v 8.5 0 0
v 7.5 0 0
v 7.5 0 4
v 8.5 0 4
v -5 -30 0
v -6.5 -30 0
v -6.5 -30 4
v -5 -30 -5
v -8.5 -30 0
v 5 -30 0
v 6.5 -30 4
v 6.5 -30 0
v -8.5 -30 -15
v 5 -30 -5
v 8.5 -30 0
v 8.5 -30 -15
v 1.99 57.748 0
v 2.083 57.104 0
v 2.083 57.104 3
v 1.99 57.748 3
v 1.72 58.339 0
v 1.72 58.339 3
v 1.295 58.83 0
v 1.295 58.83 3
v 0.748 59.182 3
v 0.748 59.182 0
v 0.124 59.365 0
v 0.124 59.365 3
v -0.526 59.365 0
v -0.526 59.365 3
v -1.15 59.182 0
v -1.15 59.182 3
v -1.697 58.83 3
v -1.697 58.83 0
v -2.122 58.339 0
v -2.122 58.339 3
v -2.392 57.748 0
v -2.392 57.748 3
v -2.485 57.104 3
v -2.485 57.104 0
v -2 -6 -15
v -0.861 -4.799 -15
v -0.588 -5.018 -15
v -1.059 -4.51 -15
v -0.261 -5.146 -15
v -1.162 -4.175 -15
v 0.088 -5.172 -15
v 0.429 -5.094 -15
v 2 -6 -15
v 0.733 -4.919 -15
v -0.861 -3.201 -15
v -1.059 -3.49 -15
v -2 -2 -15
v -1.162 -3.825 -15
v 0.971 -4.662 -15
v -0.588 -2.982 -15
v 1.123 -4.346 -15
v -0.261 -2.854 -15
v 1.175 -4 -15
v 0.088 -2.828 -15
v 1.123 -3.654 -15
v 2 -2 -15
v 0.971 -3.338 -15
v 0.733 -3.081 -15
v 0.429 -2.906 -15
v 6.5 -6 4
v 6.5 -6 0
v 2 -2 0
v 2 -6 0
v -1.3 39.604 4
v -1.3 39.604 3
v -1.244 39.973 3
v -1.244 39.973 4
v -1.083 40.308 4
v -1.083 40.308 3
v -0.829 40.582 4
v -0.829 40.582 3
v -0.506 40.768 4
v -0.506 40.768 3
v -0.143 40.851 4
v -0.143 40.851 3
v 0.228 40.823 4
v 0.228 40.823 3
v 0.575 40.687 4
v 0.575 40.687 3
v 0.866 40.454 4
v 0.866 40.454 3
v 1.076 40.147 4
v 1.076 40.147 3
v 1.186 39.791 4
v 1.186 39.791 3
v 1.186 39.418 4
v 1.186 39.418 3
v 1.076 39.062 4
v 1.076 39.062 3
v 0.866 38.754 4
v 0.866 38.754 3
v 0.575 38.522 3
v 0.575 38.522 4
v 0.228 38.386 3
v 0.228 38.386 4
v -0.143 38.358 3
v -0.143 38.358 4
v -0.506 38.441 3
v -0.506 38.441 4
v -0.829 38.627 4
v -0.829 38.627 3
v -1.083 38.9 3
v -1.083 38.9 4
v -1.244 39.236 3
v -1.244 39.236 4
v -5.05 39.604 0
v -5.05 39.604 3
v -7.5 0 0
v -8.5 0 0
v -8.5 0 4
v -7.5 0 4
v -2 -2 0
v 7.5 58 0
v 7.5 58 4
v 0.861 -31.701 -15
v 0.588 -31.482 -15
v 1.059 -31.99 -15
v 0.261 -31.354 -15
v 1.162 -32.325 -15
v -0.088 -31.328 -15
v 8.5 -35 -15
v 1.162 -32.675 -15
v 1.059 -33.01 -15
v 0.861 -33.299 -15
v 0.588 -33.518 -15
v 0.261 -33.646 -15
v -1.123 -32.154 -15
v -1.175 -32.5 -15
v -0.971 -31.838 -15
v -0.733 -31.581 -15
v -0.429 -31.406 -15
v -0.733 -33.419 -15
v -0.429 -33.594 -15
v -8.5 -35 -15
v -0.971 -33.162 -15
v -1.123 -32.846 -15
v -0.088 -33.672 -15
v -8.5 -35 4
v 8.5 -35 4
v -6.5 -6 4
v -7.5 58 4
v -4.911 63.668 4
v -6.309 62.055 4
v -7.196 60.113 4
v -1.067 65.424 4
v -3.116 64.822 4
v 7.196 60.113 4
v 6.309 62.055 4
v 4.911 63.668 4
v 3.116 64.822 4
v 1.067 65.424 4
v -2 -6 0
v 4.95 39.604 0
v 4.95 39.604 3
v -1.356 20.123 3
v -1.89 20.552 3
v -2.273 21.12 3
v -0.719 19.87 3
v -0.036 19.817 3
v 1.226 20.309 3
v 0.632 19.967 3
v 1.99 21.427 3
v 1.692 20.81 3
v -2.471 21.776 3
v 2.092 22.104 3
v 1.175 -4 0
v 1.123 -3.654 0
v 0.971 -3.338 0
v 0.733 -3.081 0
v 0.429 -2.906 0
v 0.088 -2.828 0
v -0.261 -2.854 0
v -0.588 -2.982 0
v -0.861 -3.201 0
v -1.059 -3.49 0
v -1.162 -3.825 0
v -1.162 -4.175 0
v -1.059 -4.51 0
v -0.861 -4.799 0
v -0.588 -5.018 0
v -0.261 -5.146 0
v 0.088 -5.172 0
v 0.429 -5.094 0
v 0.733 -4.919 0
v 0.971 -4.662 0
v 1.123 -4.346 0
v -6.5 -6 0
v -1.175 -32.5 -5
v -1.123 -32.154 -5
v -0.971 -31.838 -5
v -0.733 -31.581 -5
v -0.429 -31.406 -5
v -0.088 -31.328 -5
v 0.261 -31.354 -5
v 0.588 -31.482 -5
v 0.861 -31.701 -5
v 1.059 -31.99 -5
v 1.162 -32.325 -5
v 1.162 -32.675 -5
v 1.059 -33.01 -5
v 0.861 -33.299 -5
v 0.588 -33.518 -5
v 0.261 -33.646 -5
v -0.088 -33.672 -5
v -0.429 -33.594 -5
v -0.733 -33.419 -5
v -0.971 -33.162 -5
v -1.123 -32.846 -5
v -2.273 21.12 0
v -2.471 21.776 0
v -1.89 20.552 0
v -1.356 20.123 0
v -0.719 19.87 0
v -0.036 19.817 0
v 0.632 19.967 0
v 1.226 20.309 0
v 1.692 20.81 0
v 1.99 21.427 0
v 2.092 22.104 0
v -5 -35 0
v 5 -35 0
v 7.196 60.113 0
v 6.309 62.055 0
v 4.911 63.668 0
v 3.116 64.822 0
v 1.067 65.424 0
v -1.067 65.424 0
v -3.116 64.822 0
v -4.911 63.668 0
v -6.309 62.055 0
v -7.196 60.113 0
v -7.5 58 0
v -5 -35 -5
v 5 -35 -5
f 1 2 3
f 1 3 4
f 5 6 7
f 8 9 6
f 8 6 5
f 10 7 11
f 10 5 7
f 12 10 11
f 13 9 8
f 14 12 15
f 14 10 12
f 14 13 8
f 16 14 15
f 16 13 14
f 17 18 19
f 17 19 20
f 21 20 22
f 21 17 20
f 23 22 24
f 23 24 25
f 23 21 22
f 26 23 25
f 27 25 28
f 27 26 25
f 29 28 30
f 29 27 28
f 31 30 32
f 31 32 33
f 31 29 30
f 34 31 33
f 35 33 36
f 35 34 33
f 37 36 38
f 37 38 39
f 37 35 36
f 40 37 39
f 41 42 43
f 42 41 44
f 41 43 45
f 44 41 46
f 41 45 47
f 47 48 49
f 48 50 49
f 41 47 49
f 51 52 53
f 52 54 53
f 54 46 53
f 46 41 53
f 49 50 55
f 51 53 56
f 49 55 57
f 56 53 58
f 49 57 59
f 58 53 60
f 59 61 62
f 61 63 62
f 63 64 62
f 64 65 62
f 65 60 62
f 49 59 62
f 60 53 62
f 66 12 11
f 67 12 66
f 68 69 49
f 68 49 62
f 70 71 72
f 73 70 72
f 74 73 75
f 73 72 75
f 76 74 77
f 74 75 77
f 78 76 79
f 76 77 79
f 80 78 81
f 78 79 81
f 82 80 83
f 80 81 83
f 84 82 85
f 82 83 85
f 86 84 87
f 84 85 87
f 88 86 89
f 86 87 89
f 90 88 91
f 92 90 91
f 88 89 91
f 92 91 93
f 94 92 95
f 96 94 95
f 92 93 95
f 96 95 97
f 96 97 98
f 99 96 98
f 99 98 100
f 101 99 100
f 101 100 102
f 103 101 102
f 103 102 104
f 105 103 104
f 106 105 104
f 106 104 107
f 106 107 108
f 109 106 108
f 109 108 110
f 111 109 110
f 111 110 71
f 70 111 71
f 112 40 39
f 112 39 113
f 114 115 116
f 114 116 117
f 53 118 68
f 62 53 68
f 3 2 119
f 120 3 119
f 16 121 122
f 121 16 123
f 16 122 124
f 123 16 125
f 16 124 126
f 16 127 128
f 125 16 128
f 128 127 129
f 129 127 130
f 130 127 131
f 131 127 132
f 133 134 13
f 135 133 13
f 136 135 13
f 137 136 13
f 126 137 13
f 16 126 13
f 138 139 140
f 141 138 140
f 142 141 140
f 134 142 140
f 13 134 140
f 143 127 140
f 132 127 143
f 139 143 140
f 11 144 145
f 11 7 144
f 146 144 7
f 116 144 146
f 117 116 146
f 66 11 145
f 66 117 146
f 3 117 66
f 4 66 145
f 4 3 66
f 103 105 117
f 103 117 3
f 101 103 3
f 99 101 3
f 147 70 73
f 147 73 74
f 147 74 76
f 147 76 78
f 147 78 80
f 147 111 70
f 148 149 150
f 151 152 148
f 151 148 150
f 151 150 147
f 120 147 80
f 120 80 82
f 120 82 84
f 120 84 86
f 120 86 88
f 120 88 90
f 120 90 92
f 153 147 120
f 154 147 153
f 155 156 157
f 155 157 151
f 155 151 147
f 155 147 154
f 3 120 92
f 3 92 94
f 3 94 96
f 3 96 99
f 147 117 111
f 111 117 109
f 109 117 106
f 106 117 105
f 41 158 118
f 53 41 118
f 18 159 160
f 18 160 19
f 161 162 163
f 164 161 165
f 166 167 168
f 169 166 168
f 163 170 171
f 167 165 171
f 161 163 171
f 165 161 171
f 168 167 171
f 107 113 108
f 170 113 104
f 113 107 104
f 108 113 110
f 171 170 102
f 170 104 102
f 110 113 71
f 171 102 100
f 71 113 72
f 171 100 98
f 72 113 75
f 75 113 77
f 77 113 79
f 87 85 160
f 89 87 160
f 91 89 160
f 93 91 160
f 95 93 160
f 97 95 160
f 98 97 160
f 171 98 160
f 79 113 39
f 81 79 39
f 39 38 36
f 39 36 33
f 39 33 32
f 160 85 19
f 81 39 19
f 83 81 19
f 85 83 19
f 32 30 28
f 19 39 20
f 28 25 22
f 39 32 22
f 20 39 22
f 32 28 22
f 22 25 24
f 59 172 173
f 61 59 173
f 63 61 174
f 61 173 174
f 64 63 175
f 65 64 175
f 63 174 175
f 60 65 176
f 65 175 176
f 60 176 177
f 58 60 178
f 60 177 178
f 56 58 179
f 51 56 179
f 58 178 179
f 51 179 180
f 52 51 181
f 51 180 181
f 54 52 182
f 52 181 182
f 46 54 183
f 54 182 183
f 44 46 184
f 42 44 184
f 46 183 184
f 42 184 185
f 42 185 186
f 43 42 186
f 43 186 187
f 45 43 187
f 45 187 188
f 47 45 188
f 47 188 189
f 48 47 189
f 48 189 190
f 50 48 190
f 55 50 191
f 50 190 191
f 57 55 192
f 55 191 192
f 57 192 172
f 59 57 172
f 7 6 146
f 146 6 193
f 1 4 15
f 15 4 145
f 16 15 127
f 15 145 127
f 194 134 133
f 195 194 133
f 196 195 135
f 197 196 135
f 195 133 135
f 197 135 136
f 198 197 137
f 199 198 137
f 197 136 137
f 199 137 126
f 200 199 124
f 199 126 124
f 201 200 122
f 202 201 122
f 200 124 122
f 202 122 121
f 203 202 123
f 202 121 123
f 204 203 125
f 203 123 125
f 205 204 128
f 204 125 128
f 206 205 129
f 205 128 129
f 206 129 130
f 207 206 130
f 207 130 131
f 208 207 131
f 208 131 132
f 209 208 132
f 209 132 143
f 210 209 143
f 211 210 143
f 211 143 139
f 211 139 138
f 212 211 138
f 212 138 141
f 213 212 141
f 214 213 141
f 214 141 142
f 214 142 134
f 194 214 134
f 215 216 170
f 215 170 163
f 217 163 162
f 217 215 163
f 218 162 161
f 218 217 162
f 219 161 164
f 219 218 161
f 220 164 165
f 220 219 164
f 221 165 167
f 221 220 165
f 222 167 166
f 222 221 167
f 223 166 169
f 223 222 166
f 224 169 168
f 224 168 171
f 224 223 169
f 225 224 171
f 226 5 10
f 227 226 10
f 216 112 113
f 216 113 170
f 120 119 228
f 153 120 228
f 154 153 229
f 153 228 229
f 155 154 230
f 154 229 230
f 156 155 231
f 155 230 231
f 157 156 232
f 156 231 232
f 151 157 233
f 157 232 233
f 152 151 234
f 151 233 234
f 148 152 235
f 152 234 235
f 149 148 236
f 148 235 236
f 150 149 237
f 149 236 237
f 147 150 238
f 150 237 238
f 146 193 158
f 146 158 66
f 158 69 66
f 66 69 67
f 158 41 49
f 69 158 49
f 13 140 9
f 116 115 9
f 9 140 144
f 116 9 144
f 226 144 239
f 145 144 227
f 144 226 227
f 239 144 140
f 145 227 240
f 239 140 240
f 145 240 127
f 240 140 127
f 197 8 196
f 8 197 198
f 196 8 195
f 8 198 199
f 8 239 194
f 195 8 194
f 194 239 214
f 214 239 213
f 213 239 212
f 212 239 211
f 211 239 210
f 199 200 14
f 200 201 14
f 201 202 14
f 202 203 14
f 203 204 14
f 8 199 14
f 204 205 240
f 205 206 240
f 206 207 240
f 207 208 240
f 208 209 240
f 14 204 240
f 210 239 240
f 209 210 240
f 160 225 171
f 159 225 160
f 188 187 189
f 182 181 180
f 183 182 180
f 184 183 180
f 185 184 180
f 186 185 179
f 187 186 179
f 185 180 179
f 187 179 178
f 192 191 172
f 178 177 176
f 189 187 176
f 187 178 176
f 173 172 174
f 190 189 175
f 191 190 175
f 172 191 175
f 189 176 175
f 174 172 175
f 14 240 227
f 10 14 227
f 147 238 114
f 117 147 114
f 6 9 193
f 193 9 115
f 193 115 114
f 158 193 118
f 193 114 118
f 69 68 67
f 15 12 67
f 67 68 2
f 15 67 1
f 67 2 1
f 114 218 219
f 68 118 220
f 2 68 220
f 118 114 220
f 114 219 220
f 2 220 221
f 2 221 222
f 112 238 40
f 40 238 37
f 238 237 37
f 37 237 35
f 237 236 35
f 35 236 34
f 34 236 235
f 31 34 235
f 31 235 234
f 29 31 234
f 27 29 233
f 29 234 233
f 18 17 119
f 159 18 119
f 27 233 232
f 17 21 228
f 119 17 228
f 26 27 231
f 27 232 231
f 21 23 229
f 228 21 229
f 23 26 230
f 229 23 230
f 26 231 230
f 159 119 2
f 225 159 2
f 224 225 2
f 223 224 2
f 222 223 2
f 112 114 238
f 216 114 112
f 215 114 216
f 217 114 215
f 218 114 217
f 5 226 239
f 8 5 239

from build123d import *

# Parameters (mm, degrees)
EXTRUDE_1_DEPTH     = 4
SKETCH_6_W          = 17
SKETCH_6_H          = 35
EXTRUDE_2_DEPTH     = 4
SKETCH_7_W          = 13
SKETCH_7_H          = 24
CUT_EXTRUDE_3_DEPTH = 12.1
SKETCH_8_W          = 4
SKETCH_8_H          = 4
SKETCH_8_R          = 1.175
EXTRUDE_3_DEPTH     = 15
EXTRUDE_4_DEPTH     = 5
SKETCH_10_R         = 1.175
CUT_EXTRUDE_4_DEPTH = 12.7
CUT_EXTRUDE_6_DEPTH = 3
SKETCH_13_R         = 1.25
CUT_EXTRUDE_7_DEPTH = 13


with BuildPart() as part:
    # 草圖1 → 填料-伸長1 (new body)
    with BuildSketch(Plane.XY):
        with BuildLine():
            Line((7.5, 0), (7.5, 58))
            ThreePointArc((7.5, 58), (0, 65.5), (-7.5, 58))
            Line((-7.5, 58), (-7.5, 0))
            Line((-7.5, 0), (7.5, 0))
        make_face()
    extrude(amount=EXTRUDE_1_DEPTH)

    # 草圖6 → 填料-伸長2 (add)
    with BuildSketch(Plane.XY):
        with Locations((0, -17.5)):
            Rectangle(SKETCH_6_W, SKETCH_6_H)
    extrude(amount=EXTRUDE_2_DEPTH)

    # 草圖7 → 除料-伸長3 (cut)
    with BuildSketch(Plane.XY):
        with Locations((0, -18)):
            Rectangle(SKETCH_7_W, SKETCH_7_H)
    extrude(amount=CUT_EXTRUDE_3_DEPTH, mode=Mode.SUBTRACT)

    # 草圖8 → 填料-伸長3 (add)
    with BuildSketch(Plane.XY):
        with Locations((0, -4)):
            Rectangle(SKETCH_8_W, SKETCH_8_H)
        with Locations((0, -4)):
            Circle(SKETCH_8_R, mode=Mode.SUBTRACT)
    extrude(amount=-EXTRUDE_3_DEPTH)

    # 草圖9 → 填料-伸長4 (add)
    with BuildSketch(Plane(origin=(0, -35, 0), x_dir=(1, 0, 0), z_dir=(0, 1, 0))):
        Polygon((-8.5, 0), (-5, 0), (-5, 5), (5, 5), (5, 0), (8.5, 0), (8.5, 15), (-8.5, 15), align=None)
    extrude(amount=EXTRUDE_4_DEPTH)

    # 草圖10 → 除料-伸長4 (cut)
    with BuildSketch(Plane(origin=(0, 0, -15), x_dir=(-1, 0, 0), z_dir=(0, 0, -1))):
        with Locations((0, -32.5)):
            Circle(SKETCH_10_R)
    extrude(amount=-CUT_EXTRUDE_4_DEPTH, mode=Mode.SUBTRACT)

    # 草圖11 → 除料-伸長6 (cut)
    with BuildSketch(Plane(origin=(0, 0, 0), x_dir=(-1, 0, 0), z_dir=(0, 0, -1))):
        with BuildLine():
            Line((5.049815955, 39.60423521), (2.470722118, 21.775887923))
            ThreePointArc((2.470722118, 21.775887923), (0.036377399, 19.816776136), (-2.09239788, 22.10423521))
            Line((-2.09239788, 22.10423521), (-4.950184045, 39.60423521))
            Line((-4.950184045, 39.60423521), (-2.082979546, 57.10423521))
            ThreePointArc((-2.082979546, 57.10423521), (0.200975521, 59.388190276), (2.484930588, 57.10423521))
            Line((2.484930588, 57.10423521), (5.049815955, 39.60423521))
        make_face()
    extrude(amount=-CUT_EXTRUDE_6_DEPTH, mode=Mode.SUBTRACT)

    # 草圖13 → 除料-伸長7 (cut)
    with BuildSketch(Plane(origin=(0, 0, 0), x_dir=(-1, 0, 0), z_dir=(0, 0, -1))):
        with Locations((0.049815955, 39.60423521)):
            Circle(SKETCH_13_R)
    extrude(amount=-CUT_EXTRUDE_7_DEPTH, mode=Mode.SUBTRACT)


solid = part.part
